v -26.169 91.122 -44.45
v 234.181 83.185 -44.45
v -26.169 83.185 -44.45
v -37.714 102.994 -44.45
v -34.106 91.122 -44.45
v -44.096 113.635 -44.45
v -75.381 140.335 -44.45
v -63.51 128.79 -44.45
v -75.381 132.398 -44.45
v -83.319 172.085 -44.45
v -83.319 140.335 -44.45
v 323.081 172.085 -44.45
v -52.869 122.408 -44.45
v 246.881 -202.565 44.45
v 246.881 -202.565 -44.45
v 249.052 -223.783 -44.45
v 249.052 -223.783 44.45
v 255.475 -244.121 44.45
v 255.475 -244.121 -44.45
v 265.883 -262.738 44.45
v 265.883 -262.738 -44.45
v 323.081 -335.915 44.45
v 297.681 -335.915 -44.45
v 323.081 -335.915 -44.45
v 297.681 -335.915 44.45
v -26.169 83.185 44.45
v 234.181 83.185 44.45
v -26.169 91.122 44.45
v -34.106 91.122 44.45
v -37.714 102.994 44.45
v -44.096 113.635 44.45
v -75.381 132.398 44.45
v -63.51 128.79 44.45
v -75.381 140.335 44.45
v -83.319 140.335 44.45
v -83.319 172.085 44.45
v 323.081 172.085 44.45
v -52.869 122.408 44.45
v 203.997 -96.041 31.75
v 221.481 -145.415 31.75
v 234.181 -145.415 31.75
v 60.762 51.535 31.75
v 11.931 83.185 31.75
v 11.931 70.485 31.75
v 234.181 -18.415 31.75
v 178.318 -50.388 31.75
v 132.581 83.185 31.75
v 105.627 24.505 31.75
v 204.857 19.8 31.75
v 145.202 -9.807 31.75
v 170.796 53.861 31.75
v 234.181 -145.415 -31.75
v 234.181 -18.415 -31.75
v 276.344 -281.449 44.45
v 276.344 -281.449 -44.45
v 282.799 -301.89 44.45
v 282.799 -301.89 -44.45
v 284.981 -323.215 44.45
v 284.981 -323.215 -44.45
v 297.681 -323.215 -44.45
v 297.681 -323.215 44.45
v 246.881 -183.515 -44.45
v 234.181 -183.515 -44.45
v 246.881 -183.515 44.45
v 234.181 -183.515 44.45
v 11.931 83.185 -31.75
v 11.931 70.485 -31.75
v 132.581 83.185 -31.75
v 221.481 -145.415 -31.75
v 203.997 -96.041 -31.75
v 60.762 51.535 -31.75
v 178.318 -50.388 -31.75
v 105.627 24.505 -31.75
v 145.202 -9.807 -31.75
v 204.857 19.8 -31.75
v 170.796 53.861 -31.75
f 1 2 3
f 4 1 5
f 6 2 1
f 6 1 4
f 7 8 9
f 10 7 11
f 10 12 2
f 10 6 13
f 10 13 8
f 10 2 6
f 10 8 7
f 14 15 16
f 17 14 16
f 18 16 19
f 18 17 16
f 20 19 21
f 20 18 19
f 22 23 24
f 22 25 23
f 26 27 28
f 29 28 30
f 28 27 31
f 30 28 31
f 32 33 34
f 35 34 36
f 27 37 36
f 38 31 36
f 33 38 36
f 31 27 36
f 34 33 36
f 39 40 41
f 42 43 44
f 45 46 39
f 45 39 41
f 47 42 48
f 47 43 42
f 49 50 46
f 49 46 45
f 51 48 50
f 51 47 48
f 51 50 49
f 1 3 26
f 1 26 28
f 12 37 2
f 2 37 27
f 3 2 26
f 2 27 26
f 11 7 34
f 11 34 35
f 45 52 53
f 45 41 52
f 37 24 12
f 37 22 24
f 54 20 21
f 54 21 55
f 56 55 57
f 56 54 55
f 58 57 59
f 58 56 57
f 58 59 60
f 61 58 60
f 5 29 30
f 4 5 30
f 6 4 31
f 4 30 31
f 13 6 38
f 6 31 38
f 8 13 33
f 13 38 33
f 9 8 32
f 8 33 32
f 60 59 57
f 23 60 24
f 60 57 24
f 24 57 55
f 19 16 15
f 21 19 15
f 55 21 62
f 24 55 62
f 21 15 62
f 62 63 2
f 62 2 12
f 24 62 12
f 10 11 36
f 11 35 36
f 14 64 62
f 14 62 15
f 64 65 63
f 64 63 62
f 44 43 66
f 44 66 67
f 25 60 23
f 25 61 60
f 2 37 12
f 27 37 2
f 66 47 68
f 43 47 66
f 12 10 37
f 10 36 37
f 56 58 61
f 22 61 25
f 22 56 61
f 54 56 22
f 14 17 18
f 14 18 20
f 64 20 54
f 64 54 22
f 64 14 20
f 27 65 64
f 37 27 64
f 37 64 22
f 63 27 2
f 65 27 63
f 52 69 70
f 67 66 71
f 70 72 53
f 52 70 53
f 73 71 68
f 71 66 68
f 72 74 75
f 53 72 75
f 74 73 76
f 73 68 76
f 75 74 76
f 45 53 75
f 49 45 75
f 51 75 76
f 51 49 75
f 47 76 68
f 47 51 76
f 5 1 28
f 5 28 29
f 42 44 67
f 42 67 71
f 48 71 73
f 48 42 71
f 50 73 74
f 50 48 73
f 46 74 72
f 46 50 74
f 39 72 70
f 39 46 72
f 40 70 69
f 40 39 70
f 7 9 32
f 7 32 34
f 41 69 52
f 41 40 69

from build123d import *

# Parameters (mm, degrees)
BOSS_EXTRUDE1_DEPTH = 44.45
BOSS_EXTRUDE2_DEPTH = 31.75
BOSS_EXTRUDE3_DEPTH = 44.45


with BuildPart() as part:
    # Sketch1 → Boss-Extrude1 (new body, symmetric)
    with BuildSketch(Plane.XY):
        with BuildLine():
            Line((-75.381276984, 132.3975), (-75.381276984, 140.335))
            Line((-75.381276984, 140.335), (-83.318776984, 140.335))
            Line((-83.318776984, 140.335), (-83.318776984, 172.085))
            Line((-83.318776984, 172.085), (323.081223016, 172.085))
            Line((323.081223016, 172.085), (234.181223016, 83.185))
            Line((234.181223016, 83.185), (-26.168776984, 83.185))
            Line((-26.168776984, 83.185), (-26.168776984, 91.1225))
            Line((-26.168776984, 91.1225), (-34.106276984, 91.1225))
            ThreePointArc((-34.106276984, 91.1225), (-48.213203493, 118.290573491), (-75.381276984, 132.3975))
        make_face()
    extrude(amount=BOSS_EXTRUDE1_DEPTH, both=True)


with BuildPart() as body_2:
    # Sketch1_3 → Boss-Extrude2 (new body, symmetric)
    with BuildSketch(Plane.XY):
        with BuildLine():
            ThreePointArc((234.181223016, -18.415), (188.38389644, 37.387673425), (132.581223016, 83.185))
            Line((132.581223016, 83.185), (11.931223016, 83.185))
            Line((11.931223016, 83.185), (11.931223016, 70.485))
            ThreePointArc((11.931223016, 70.485), (145.202260763, -9.80708101), (221.481223016, -145.415))
            Line((221.481223016, -145.415), (234.181223016, -145.415))
            Line((234.181223016, -145.415), (234.181223016, -18.415))
        make_face()
    extrude(amount=BOSS_EXTRUDE2_DEPTH, both=True)


with BuildPart() as body_3:
    # Sketch1_4 → Boss-Extrude3 (new body, symmetric)
    with BuildSketch(Plane.XY):
        with BuildLine():
            Line((323.081223016, -335.915), (323.081223016, 172.085))
            Line((323.081223016, 172.085), (234.181223016, 83.185))
            Line((234.181223016, 83.185), (234.181223016, -183.515))
            Line((234.181223016, -183.515), (246.881223016, -183.515))
            Line((246.881223016, -183.515), (246.881223016, -202.565))
            ThreePointArc((246.881223016, -202.565), (251.744599276, -234.116039076), (265.883238129, -262.738047859))
            ThreePointArc((265.883238129, -262.738047859), (280.093284249, -291.504612242), (284.981223016, -323.215))
            Line((284.981223016, -323.215), (297.681223016, -323.215))
            Line((297.681223016, -323.215), (297.681223016, -335.915))
            Line((297.681223016, -335.915), (323.081223016, -335.915))
        make_face()
    extrude(amount=BOSS_EXTRUDE3_DEPTH, both=True)


solid = Compound([part.part, body_2.part, body_3.part])
